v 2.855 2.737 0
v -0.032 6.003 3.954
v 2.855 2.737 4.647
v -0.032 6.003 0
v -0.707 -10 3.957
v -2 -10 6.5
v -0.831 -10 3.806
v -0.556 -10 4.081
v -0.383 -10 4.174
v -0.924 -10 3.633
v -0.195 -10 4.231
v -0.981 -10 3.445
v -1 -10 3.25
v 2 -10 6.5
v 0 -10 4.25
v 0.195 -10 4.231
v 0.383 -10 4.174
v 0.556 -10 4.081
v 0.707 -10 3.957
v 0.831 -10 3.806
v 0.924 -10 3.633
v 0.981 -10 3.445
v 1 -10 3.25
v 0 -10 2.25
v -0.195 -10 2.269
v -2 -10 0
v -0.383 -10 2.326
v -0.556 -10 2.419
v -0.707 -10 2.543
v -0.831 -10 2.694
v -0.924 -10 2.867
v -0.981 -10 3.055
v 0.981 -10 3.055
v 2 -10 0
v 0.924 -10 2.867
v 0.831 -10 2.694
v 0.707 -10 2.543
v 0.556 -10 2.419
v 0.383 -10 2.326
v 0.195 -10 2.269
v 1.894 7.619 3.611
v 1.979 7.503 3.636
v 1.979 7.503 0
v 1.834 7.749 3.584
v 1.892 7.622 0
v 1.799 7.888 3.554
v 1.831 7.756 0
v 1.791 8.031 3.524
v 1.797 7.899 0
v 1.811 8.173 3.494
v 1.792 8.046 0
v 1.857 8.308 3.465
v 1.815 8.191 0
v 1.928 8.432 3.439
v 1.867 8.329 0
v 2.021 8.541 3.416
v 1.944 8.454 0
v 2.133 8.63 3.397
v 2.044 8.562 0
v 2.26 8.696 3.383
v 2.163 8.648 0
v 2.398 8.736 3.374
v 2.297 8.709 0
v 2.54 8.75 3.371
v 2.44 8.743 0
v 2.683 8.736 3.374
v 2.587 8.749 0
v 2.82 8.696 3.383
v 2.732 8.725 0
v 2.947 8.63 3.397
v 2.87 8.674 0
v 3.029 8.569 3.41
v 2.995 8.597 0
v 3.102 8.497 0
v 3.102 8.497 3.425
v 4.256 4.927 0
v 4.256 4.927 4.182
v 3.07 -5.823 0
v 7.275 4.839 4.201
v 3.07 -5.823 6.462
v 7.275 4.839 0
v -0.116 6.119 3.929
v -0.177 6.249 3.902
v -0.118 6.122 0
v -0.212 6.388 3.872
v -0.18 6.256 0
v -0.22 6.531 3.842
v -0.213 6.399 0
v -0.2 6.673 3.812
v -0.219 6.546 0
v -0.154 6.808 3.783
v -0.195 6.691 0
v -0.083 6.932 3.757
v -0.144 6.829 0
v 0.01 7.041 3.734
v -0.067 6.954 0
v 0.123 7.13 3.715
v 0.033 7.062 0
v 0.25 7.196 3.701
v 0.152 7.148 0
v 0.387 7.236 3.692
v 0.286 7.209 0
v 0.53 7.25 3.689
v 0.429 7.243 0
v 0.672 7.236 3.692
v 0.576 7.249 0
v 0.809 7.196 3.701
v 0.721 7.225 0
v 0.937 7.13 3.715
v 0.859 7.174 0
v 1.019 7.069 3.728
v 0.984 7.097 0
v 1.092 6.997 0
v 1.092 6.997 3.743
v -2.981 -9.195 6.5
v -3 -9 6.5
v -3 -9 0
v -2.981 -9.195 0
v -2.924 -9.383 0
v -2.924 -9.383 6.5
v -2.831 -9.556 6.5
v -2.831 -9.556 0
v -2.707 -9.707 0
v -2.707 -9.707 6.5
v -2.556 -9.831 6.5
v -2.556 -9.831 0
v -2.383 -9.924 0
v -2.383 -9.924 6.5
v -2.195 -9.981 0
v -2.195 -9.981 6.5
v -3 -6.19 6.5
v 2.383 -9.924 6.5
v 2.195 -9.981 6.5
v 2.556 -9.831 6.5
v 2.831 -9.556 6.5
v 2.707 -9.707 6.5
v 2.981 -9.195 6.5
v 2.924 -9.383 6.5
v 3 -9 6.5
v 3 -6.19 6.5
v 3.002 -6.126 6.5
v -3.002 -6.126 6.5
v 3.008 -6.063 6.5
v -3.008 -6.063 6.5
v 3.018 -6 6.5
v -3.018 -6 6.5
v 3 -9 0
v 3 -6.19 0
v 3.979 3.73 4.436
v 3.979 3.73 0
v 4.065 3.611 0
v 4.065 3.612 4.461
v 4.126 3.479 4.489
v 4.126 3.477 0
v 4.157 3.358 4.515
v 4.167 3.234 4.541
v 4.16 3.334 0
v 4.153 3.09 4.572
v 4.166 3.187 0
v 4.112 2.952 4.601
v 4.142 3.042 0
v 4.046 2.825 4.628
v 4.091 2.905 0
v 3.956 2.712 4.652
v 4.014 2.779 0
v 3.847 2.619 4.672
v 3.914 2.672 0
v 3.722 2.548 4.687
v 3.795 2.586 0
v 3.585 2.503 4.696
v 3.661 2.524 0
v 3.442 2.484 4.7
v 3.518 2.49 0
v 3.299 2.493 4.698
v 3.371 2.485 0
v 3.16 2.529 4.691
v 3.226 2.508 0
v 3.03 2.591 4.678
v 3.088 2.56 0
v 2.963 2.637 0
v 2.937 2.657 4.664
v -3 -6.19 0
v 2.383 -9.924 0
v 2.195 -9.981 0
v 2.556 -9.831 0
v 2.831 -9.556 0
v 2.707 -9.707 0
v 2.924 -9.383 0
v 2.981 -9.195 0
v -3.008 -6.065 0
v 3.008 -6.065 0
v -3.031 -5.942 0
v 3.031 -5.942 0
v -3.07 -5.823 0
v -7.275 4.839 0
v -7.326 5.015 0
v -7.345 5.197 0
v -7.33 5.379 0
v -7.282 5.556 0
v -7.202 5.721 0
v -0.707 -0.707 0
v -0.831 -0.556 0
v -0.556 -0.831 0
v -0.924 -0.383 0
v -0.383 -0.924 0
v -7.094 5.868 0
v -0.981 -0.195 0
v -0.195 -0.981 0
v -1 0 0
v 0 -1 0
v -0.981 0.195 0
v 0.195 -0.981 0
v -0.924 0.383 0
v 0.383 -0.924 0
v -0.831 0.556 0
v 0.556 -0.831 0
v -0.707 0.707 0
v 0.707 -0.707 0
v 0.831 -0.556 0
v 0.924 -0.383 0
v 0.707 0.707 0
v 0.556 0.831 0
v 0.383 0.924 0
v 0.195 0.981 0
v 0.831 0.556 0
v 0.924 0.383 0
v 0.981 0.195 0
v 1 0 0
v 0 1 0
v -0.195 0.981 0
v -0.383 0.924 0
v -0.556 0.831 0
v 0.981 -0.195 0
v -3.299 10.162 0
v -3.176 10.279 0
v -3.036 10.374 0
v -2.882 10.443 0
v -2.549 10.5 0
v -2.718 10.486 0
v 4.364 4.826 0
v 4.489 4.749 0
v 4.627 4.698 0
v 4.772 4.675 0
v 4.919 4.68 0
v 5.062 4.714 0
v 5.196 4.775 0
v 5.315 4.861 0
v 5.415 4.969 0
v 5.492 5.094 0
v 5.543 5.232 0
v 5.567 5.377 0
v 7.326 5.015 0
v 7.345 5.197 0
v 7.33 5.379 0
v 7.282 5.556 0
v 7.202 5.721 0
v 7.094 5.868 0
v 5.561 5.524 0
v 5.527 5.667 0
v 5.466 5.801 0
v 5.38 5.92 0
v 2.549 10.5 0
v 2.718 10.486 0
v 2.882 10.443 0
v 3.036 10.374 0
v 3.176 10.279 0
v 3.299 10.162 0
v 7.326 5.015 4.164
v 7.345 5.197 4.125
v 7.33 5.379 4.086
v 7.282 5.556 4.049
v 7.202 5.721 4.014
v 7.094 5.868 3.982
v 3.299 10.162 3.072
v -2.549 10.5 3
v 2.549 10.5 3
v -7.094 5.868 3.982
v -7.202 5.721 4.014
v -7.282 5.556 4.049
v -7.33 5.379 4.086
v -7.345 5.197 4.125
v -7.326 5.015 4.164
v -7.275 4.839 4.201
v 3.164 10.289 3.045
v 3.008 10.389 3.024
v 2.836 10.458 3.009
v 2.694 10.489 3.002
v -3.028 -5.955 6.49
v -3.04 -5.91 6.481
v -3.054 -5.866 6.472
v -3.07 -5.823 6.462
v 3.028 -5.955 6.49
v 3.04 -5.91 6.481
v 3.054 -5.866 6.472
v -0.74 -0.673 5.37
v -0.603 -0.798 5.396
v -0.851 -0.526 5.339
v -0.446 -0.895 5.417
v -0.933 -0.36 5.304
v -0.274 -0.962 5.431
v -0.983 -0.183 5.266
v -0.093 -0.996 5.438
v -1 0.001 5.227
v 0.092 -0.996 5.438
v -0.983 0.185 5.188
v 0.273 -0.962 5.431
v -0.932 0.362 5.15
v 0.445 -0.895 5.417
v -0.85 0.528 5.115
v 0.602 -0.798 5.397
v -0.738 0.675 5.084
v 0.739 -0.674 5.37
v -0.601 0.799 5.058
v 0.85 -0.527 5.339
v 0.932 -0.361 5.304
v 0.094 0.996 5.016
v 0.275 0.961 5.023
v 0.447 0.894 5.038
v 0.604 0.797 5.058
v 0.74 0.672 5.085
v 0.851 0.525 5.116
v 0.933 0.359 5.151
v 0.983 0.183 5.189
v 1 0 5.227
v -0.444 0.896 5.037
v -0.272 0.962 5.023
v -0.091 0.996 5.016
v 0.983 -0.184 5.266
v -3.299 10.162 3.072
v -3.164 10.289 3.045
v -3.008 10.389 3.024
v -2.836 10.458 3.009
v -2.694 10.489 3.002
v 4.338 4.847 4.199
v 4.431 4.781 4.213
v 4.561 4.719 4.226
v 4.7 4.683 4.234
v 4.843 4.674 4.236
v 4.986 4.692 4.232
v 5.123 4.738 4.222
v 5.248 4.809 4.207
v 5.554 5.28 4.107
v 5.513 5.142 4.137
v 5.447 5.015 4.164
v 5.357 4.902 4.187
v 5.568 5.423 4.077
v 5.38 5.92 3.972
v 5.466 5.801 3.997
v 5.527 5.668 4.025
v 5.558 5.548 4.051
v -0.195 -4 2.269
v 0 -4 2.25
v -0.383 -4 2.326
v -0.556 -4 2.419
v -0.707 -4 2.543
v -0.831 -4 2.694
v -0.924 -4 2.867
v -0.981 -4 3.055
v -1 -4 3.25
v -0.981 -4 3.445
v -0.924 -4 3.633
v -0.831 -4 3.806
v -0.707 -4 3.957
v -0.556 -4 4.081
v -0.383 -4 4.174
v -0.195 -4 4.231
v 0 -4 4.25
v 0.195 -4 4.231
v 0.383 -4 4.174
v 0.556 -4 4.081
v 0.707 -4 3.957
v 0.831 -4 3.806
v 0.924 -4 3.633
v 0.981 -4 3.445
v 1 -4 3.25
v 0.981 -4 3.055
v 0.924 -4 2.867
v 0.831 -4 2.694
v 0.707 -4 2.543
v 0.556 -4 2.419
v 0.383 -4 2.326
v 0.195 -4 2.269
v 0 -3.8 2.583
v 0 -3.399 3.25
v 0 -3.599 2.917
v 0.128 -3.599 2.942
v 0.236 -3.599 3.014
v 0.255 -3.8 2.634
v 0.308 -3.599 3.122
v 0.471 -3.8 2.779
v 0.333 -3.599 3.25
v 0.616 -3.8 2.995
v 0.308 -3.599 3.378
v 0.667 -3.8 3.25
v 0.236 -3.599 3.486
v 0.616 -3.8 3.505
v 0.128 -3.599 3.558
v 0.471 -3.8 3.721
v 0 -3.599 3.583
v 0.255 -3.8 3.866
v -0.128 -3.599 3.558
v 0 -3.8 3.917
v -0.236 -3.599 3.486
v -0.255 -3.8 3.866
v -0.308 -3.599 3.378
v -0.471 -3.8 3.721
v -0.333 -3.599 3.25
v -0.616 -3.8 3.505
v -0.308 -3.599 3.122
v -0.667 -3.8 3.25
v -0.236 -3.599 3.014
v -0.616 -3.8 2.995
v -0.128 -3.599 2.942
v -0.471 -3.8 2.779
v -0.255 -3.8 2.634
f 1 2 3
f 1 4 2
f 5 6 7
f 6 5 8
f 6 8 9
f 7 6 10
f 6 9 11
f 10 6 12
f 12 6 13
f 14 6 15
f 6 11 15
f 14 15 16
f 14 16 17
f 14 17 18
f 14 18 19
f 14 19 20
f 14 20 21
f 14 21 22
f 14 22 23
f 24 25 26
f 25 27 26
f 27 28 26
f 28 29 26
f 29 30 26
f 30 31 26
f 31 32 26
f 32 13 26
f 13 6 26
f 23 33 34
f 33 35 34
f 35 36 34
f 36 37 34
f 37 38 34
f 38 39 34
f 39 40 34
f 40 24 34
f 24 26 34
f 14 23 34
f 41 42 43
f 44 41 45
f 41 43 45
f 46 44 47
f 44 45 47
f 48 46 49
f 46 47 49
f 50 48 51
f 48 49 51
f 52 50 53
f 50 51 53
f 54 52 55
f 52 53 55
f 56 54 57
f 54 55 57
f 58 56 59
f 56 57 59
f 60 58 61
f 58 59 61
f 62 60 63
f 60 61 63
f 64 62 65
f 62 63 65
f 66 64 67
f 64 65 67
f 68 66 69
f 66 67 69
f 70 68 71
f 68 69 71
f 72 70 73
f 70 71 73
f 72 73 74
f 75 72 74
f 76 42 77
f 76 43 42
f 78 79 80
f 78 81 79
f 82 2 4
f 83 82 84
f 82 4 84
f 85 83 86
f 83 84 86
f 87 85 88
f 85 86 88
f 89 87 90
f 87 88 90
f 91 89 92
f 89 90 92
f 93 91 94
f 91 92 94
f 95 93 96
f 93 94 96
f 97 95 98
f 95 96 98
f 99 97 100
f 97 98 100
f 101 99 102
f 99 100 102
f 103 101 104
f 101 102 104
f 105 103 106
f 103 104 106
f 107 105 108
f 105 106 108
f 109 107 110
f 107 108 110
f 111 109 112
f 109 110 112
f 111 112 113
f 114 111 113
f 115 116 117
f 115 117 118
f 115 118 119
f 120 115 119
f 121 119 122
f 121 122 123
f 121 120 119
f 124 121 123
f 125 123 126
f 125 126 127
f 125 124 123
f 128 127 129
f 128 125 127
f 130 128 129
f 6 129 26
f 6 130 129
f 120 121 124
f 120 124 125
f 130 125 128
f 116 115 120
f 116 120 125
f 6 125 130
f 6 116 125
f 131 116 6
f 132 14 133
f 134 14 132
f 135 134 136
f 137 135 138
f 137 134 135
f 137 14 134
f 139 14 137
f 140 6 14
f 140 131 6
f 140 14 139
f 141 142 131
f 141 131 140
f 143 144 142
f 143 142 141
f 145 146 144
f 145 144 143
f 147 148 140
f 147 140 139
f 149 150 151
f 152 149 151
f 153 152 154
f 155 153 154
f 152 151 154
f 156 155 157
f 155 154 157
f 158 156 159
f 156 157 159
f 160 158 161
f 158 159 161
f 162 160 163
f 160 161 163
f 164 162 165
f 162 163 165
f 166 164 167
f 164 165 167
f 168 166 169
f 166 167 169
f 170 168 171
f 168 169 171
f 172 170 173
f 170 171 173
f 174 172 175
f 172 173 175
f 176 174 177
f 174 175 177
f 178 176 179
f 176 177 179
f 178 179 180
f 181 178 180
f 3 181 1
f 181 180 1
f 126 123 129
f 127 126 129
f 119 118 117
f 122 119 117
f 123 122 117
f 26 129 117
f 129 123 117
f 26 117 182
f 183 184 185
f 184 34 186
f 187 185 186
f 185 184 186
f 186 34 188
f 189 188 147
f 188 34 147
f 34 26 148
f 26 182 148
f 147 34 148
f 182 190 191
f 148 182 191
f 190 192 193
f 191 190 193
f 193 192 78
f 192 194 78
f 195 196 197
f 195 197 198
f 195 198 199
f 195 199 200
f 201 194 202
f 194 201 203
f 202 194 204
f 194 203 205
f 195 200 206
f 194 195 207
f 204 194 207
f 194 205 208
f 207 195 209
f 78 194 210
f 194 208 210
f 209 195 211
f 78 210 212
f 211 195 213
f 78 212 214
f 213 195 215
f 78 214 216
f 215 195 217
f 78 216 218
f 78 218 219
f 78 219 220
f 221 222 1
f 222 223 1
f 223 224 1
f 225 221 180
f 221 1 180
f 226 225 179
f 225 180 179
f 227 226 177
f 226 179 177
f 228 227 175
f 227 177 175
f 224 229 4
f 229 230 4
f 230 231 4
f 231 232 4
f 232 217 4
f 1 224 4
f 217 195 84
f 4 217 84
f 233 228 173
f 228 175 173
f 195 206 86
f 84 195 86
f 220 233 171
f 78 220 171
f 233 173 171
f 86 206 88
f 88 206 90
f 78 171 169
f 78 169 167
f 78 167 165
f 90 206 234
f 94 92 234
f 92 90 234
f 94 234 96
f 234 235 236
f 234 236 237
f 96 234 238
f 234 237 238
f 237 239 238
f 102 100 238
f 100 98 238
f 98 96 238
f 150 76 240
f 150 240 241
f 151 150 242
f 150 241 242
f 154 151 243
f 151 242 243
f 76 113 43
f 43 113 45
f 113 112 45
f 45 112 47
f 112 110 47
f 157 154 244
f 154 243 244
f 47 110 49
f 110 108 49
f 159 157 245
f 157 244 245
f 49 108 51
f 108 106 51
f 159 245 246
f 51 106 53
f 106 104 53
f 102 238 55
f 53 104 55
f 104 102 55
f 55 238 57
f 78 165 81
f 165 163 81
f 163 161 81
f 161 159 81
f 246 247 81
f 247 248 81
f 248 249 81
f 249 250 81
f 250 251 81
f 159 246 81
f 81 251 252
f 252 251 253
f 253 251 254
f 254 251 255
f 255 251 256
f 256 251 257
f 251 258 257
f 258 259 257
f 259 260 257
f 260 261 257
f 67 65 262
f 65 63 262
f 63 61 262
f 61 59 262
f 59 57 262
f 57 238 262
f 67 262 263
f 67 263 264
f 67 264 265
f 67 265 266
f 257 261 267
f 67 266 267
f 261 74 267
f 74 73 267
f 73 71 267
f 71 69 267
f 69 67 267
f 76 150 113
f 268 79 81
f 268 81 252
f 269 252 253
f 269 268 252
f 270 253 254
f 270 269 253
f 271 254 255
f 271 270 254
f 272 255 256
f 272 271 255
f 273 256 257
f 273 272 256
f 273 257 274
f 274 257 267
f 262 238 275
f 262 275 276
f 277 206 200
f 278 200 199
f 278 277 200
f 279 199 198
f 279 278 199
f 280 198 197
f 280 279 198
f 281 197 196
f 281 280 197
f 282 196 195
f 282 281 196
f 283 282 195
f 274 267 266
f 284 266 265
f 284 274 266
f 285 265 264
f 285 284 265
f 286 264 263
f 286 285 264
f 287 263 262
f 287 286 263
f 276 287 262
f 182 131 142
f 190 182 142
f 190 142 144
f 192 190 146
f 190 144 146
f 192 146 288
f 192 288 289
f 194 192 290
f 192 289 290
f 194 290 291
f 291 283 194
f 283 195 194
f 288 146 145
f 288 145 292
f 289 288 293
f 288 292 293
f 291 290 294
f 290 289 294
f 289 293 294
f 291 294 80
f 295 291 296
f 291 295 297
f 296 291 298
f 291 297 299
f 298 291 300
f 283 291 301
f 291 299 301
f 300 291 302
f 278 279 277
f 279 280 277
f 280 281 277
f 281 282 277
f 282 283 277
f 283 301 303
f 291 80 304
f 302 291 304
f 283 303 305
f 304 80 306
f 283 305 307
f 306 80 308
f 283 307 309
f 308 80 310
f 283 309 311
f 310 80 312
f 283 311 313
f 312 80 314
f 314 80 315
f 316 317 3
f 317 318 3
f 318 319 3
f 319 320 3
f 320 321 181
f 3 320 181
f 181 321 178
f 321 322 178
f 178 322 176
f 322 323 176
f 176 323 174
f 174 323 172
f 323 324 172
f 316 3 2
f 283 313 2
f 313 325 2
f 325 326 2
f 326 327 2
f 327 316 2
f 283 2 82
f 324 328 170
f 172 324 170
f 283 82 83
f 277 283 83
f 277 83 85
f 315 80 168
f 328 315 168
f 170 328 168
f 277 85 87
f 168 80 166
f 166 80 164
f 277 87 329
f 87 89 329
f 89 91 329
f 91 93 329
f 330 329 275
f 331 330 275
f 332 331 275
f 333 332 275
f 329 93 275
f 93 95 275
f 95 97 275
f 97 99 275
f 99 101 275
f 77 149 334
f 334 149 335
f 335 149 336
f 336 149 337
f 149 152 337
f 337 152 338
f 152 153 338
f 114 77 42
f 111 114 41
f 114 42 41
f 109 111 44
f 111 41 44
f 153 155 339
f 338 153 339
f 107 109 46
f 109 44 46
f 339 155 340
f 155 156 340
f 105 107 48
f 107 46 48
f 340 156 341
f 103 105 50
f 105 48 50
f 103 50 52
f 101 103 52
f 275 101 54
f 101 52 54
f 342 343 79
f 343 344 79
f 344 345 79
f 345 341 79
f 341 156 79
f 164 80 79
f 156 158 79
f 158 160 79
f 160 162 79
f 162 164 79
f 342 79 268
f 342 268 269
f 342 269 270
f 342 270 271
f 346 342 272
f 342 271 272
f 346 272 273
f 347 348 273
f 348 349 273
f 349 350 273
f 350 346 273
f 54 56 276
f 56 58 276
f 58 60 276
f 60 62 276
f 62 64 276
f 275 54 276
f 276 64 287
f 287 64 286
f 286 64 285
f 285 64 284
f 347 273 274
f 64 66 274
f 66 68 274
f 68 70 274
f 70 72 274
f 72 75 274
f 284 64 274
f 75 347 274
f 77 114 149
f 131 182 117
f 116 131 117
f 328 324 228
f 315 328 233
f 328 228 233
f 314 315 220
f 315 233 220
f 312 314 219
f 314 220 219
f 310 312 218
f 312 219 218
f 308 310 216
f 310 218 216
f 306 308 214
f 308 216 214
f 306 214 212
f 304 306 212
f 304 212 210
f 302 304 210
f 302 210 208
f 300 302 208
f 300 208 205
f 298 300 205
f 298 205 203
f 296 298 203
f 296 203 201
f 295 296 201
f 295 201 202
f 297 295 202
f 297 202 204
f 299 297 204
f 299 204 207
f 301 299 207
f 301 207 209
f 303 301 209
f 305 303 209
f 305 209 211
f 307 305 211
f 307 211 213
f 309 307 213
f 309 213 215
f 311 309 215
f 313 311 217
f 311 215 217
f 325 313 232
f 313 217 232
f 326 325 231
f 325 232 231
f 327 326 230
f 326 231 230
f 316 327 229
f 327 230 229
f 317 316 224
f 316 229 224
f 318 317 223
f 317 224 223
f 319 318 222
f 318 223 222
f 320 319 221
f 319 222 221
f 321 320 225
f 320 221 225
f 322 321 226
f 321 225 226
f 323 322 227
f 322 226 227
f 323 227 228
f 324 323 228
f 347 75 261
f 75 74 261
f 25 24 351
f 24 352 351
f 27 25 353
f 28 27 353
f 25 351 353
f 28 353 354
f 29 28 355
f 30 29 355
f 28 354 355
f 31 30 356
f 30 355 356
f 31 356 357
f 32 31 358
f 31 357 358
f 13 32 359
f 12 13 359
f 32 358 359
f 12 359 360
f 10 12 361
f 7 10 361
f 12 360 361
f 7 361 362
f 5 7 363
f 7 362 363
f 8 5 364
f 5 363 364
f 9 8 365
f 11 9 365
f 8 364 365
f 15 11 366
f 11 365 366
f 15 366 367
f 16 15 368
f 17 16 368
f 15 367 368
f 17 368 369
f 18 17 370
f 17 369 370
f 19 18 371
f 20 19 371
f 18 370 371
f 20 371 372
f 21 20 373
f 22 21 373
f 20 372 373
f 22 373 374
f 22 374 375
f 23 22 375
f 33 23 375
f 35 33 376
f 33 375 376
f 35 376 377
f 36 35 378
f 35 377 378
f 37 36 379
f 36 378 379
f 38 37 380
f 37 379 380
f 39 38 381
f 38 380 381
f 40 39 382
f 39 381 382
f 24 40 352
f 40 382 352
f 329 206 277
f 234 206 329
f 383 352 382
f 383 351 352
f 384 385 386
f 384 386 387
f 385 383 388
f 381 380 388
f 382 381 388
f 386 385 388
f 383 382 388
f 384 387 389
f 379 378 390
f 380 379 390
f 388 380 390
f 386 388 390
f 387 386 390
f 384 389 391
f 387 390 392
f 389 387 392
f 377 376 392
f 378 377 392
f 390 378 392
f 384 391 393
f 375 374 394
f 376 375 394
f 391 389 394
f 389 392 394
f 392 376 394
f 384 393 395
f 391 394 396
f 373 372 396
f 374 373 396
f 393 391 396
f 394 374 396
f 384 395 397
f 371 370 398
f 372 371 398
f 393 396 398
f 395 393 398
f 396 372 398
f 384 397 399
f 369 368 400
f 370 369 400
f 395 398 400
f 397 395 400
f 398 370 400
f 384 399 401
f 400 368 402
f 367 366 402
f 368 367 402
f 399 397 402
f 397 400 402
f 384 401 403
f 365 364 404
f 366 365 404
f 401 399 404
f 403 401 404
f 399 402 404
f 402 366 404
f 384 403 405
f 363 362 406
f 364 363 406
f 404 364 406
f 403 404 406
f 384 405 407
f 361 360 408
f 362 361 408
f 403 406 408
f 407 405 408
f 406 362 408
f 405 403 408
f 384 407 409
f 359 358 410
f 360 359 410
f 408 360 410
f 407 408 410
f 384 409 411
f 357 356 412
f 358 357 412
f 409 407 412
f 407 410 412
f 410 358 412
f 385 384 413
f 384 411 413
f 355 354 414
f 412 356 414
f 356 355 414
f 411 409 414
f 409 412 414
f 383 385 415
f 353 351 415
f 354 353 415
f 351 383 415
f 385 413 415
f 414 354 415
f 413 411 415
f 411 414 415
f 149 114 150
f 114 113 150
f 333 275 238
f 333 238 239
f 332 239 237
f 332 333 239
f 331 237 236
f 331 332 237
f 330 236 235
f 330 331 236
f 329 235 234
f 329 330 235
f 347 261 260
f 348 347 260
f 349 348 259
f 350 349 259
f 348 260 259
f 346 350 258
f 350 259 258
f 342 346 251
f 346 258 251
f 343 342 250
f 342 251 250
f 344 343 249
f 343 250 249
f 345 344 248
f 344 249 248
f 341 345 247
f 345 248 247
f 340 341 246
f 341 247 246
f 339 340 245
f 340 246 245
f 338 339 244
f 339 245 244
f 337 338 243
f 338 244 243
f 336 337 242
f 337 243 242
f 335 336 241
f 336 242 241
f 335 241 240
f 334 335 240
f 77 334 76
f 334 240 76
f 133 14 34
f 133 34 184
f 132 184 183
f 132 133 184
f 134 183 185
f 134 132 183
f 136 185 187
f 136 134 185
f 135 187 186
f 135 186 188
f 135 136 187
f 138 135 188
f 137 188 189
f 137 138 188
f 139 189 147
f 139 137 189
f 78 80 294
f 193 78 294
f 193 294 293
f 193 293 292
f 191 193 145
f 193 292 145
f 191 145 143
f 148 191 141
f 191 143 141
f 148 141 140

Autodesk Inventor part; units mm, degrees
ref_plane "YZ Plane" through (0, 0, 0) normal (1, 0, 0) x (0, 1, 0)
ref_plane "XZ Plane" through (0, 0, 0) normal (0, 1, 0) x (-1, 0, 0)
sketch "Base" plane through (0, 0, 0) normal (0, 0, 1) x (1, 0, 0)
  line L0 (-7.5, 5.4092) -> (-3, 10.5)
  line L1 (-3, -6) -> (-3, -10)
  line L2 (-7.5, 5.4092) -> (-3, -6)
  line L3 (0, 10.5) -> (0, -10) construction
  line L4 (7.5, 5.4092) -> (3, 10.5)
  line L5 (3, -6) -> (3, -10)
  line L6 (7.5, 5.4092) -> (3, -6)
  circle A0 centre (0, 0) radius 1
  line L7 (0.5297, 6.5) -> (3.417, 3.2336) construction
  line L8 (2.5405, 8) -> (4.8181, 5.4233) construction
  circle A1 centre (0.5297, 6.5) radius 0.75
  circle A2 centre (2.5405, 8) radius 0.75
  circle A3 centre (3.417, 3.2336) radius 0.75
  circle A4 centre (4.8181, 5.4233) radius 0.75
  line L9 (-3, 10.5) -> (3, 10.5)
  line L10 (-3, -10) -> (3, -10)
  line L11 (3.1024, 8.4967) -> (5.3801, 5.92)
  line L12 (1.9786, 7.5033) -> (4.2562, 4.9266)
  line L13 (1.0917, 6.9967) -> (3.9789, 3.7303)
  line L14 (-0.0322, 6.0033) -> (2.8551, 2.7369)
  dimension "d13" = 2
  dimension "d14" = 1.5
  dimension "d17" = 2
  dimension "d18" = 2.5
  dimension "d20" = 6
  dimension "d23" = 117
  dimension "d24" = 6
  dimension "d25" = 15
  dimension "d26" = 4
  dimension "d28" = 2.5
  dimension "d29" = 3
  dimension "d30" = 2.5
  dimension "d31" = 4
  dimension "d32" = 16.5
  dimension "d56" = 10
extrude "BaseFeature" add sketch "Base" along normal blind 6.5
ref_plane "MidPlane" through (0, -13.6061, 0) normal (-1, 0, 0) x (0, 0, -1)
sketch "SideProfile" plane through (0, -13.6061, 0) normal (-1, 0, 0) x (0, 0, -1)
  line L0 (0, -24.1061) -> (-6.5, -24.1061) projected
  line L1 (-6.5, -7.6061) -> (-3, -24.1061)
  line L2 (-3, -24.1061) -> (0, -24.1061)
  line L3 (0, -24.1061) -> (0, -7.6061)
  line L4 (-6.5, -3.6061) -> (-6.5, -7.6061)
  line L5 (-6.5, -3.6061) -> (0, -3.6061)
  line L6 (0, -3.6061) -> (0, -7.6061)
  dimension "d37" = 3
extrude "SideProfileFeature" cut sketch "SideProfile" along normal through all both and the other way through all keep common part
fillet "BaseFilletsFeature" radius 1 8 edges at (-3, 10.5, 1.5) (-7.5, 5.4092, 2.0399) (-3, -6, 3.25) (-3, -10, 3.25) (3, -10, 3.25) (3, -6, 3.25) (7.5, 5.4092, 2.0399) (3, 10.5, 1.5)
sketch "FrontHole" plane through (-2, -10, 6.5) normal (0, -1, 0) x (1, 0, 0)
  circle A0 centre (2, -3.25) radius 1.25
  line L0 (0, -6.5) -> (4, -6.5) projected
  line L1 (0, 0) -> (4, 0) projected
  line L2 (4, 0) -> (4, -6.5) projected
  line L3 (0, -6.5) -> (0, 0) projected
  dimension "d41" = 2.5
  dimension "d42" = 6.5
  dimension "d43" = 4
  dimension "d44" = 3.25
  dimension "d45" = 2
hole "FrontHoleFeature" at (0, -10, 3.25) direction (0, 1, 0) diameter 2 depth 6 tip angle 118
equation "\"d44\" = 0.5 * d42"
equation "\"d45\" = 0.5 * d43"
properties part number "ForearmPistonConnector"
